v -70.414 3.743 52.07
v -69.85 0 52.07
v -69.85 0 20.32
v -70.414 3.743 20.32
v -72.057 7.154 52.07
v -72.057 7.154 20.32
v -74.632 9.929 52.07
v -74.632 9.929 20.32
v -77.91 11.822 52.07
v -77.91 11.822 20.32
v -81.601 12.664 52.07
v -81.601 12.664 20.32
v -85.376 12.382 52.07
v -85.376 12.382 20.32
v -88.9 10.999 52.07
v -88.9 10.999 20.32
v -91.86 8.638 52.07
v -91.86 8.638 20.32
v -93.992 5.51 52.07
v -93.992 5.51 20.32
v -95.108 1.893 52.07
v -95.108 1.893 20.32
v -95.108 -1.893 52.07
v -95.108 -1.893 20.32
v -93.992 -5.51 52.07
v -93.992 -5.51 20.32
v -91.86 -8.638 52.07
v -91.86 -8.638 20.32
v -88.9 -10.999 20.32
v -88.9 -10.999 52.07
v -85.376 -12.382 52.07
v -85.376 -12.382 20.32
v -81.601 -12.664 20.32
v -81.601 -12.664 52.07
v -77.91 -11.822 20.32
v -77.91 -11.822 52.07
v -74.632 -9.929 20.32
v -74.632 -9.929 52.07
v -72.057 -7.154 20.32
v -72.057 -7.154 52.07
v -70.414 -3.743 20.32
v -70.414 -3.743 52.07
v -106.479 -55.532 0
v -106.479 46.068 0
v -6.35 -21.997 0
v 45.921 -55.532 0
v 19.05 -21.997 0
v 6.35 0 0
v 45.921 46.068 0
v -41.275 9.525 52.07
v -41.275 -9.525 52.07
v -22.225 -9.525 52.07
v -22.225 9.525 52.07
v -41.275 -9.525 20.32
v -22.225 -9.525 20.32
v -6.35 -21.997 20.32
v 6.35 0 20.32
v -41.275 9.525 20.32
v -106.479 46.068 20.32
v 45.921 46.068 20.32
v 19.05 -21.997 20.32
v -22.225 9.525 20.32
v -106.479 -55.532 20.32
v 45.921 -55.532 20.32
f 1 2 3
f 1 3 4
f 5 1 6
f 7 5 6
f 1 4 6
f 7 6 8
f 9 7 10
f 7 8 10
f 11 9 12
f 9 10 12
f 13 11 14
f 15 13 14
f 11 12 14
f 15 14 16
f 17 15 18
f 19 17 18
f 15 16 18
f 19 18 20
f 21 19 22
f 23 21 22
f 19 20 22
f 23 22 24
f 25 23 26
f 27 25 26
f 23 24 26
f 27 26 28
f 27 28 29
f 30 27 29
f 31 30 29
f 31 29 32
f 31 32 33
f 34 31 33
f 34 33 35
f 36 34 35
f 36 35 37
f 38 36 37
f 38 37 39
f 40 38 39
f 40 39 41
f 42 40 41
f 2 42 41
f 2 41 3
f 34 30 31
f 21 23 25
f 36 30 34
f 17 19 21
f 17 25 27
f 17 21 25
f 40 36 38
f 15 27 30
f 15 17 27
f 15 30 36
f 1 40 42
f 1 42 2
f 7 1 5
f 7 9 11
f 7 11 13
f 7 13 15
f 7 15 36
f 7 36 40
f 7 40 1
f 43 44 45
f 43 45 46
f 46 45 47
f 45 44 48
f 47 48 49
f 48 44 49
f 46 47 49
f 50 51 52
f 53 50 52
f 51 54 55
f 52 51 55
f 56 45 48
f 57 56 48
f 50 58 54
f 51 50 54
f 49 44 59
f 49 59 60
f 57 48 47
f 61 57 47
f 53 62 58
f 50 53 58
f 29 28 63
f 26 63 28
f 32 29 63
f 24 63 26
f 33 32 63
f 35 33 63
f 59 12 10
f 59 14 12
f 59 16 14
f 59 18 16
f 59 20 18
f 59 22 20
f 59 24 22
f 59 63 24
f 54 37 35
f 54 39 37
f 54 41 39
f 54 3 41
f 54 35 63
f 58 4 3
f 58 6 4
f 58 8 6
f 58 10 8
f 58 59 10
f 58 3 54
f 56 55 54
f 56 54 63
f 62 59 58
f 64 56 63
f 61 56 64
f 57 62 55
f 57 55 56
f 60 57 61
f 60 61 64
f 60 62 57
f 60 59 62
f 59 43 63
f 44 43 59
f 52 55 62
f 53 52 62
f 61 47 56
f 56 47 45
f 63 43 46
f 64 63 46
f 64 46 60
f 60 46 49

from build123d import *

# Parameters (mm, degrees)
F0_R     = 12.7
F0_W     = 152.4
F0_H     = 101.6
F1_DEPTH = 20.32
F2_DEPTH = 52.07
F3_DEPTH = 52.07


with BuildPart() as f1:
    # F0 (on Top) → F1 (new body)
    with BuildSketch(Plane.XY):
        with Locations((-82.55, 0)):
            Circle(F0_R)
        with Locations((-30.279235, -4.731591)):
            Rectangle(F0_W, F0_H)
        Polygon((-6.35, -21.997045), (6.35, 0), (19.05, -21.997045), align=None, mode=Mode.SUBTRACT)
        with Locations((-82.55, 0)):
            Circle(F0_R, mode=Mode.SUBTRACT)
        Polygon((-22.225, 9.525), (-22.225, 0), (-22.225, -9.525), (-41.275, -9.525), (-41.275, 0), (-41.275, 9.525), align=None, mode=Mode.SUBTRACT)
    extrude(amount=F1_DEPTH)

    # F0 (on Top) → F2 (join)
    with BuildSketch(Plane.XY):
        Polygon((-22.225, -9.525), (-22.225, 0), (-31.75, 0), (-41.275, 0), (-41.275, -9.525), align=None)
        Polygon((-31.75, 0), (-22.225, 0), (-22.225, 9.525), (-41.275, 9.525), (-41.275, 0), align=None)
    extrude(amount=F2_DEPTH)

    # F0 (on Top) → F3 (join)
    with BuildSketch(Plane.XY):
        with Locations((-82.55, 0)):
            Circle(F0_R)
    extrude(amount=F3_DEPTH)


solid = f1.part
